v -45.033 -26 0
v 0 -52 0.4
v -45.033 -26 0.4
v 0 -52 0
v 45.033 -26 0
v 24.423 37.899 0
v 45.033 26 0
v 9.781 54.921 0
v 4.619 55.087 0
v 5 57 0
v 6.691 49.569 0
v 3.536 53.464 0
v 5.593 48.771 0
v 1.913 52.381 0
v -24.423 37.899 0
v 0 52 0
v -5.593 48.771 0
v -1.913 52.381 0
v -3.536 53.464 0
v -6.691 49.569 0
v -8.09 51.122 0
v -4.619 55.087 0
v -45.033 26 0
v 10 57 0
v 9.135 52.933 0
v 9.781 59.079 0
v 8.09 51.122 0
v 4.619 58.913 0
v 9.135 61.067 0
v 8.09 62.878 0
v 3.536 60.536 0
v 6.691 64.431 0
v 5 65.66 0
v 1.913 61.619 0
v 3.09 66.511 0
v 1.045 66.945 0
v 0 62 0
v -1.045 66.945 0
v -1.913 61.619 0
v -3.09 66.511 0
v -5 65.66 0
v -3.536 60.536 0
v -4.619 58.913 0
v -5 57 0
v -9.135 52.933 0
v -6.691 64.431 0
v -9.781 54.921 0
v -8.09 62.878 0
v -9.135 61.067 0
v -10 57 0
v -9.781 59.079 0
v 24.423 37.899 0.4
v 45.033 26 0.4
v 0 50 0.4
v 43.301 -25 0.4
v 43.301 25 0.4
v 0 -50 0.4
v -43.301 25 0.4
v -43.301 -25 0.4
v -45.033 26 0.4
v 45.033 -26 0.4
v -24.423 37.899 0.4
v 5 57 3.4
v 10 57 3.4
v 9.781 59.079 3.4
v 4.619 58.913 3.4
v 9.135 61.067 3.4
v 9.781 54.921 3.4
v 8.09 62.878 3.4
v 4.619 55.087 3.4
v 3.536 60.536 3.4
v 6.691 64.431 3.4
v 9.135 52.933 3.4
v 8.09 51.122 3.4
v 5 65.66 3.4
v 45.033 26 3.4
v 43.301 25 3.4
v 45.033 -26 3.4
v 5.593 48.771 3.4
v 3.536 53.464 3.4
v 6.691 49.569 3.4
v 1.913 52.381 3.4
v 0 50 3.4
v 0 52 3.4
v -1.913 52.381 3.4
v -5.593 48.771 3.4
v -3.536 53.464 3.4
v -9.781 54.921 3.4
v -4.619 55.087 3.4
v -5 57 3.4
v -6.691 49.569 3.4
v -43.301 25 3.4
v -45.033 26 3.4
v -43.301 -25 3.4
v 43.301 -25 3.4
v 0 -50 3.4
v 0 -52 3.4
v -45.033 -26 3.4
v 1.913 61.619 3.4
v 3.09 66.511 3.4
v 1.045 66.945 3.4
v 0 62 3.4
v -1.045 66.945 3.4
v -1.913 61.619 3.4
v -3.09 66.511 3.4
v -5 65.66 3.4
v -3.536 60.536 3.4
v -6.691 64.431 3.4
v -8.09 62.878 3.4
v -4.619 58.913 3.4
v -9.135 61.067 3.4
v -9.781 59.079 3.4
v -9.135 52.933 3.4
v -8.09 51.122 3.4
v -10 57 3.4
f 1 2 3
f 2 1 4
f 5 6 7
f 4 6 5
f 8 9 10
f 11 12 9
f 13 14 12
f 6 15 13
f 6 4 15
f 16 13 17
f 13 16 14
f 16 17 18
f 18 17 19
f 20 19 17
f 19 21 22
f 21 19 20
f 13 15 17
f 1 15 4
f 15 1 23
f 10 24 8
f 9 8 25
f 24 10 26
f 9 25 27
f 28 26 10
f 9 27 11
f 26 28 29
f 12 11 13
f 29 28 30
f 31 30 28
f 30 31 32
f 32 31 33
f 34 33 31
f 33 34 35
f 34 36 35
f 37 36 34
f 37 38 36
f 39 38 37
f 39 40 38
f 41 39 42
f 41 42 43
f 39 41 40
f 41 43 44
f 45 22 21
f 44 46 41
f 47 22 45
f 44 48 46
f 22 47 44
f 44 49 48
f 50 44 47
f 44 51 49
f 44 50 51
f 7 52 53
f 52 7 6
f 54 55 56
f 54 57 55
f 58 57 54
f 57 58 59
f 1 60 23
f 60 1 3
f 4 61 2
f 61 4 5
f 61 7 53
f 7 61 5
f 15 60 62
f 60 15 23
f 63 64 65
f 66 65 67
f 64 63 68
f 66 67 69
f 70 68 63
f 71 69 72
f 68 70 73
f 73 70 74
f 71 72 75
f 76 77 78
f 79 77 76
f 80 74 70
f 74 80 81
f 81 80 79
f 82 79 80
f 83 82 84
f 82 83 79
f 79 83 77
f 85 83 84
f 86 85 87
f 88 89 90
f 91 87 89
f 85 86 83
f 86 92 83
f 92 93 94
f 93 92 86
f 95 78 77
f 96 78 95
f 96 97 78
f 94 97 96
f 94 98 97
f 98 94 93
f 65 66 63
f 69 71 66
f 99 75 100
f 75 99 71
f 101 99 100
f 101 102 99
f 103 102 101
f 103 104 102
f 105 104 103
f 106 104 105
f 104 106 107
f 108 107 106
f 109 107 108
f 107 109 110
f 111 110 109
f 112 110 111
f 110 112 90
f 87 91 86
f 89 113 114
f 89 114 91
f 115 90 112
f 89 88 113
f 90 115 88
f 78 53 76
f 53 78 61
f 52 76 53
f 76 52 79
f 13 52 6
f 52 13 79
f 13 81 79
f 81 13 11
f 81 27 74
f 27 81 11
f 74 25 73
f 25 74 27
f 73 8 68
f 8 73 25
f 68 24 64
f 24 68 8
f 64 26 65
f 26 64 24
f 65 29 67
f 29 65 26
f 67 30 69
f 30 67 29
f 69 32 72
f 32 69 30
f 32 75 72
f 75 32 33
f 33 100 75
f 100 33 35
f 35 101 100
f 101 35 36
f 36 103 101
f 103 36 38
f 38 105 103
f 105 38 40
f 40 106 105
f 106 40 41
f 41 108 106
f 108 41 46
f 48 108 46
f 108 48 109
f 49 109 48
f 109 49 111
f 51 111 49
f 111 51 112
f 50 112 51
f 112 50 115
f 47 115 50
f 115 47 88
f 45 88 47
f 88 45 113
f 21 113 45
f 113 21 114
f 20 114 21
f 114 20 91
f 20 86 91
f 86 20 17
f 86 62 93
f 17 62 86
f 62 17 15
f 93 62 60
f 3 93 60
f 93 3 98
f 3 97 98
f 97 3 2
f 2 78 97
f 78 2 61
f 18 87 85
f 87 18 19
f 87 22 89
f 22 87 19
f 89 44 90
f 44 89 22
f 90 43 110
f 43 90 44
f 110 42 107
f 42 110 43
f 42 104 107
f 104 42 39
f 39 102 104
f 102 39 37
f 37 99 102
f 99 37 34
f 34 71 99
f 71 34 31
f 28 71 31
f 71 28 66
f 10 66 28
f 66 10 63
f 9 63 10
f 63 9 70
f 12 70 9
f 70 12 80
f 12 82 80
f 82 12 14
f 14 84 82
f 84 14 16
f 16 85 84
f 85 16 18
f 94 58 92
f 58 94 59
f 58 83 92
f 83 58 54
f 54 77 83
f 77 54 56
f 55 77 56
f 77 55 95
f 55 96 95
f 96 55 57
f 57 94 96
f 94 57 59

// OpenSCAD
// [FL_INDEX: keywords="openscad, 3d_parametric, With_polygonal_frame__Customizable_Lithophane, csg_solid" | COT="Parametric OpenSCAD design from 3DCodeverse"]
// Title: [With polygonal frame] Customizable Lithophane

// preview[view:south, tilt:top]

// Lithophane V2 with different frame types
// Original script made by Makerbot (http://www.thingiverse.com/thing:74322)
// Modified by Carlosgs (http://carlosgs.es)


/* [Image] */

// Load a 150x150 pixel image.(images will be stretched to fit) Simple photos work best. Don't forget to click the Invert Colors checkbox!
image_file = "image-surface.dat"; // [image_surface:150x150]

/* [Adjustments] */

hole_diameter = 10;

image_angle = 0; // [0:360]

frame_side_number = 6; // [3:50]

// What layer height will you slice this at?  The thinner the better.
layer_height = 0.2;

// The lower the layer height, the more layers you can use.
number_of_layers = 15; // [5:20]

/* [Hidden] */

length = 100;
width = 100;
// base (white) will always be 2 layers thick
min_layer_height = layer_height*2;
hole_radius = hole_diameter/2;
height = layer_height*number_of_layers;

union() {
  // take just the part of surface we want
intersection() {
  difference() {
    rotate([0,0,image_angle]) translate([0, 0, min_layer_height]) scale([100/150,100/150,height]) surface(file=image_file, center=true, convexity=5);
    translate([0,0,-(height+min_layer_height)]) linear_extrude(height=height+min_layer_height) square([length, width], center=true);
  }
    rotate([0,0,90])
      cylinder(r=length/2,h=height*2,$fn=frame_side_number);
}
  //linear_extrude(height=layer_height*2) square([length+4, width+4], center=true);
  linear_extrude(height=layer_height*2)
    rotate([0,0,90])
      circle(r=(length+4)/2, center=true, $fn=frame_side_number);

  linear_extrude(height=height+min_layer_height){
	  difference(){
		union(){
	     rotate([0,0,90])
          circle(r=(length+4)/2, center=true, $fn=frame_side_number);
		  translate([0, width/2+hole_radius+2, 0])
		    circle(r=hole_radius+5);
		}
	    union(){
	     rotate([0,0,90])
          circle(r=length/2, center=true, $fn=frame_side_number);
		  translate([0, width/2+hole_radius+2, 0])
	        circle(r=hole_radius);
	    }
	  }
  }
}
